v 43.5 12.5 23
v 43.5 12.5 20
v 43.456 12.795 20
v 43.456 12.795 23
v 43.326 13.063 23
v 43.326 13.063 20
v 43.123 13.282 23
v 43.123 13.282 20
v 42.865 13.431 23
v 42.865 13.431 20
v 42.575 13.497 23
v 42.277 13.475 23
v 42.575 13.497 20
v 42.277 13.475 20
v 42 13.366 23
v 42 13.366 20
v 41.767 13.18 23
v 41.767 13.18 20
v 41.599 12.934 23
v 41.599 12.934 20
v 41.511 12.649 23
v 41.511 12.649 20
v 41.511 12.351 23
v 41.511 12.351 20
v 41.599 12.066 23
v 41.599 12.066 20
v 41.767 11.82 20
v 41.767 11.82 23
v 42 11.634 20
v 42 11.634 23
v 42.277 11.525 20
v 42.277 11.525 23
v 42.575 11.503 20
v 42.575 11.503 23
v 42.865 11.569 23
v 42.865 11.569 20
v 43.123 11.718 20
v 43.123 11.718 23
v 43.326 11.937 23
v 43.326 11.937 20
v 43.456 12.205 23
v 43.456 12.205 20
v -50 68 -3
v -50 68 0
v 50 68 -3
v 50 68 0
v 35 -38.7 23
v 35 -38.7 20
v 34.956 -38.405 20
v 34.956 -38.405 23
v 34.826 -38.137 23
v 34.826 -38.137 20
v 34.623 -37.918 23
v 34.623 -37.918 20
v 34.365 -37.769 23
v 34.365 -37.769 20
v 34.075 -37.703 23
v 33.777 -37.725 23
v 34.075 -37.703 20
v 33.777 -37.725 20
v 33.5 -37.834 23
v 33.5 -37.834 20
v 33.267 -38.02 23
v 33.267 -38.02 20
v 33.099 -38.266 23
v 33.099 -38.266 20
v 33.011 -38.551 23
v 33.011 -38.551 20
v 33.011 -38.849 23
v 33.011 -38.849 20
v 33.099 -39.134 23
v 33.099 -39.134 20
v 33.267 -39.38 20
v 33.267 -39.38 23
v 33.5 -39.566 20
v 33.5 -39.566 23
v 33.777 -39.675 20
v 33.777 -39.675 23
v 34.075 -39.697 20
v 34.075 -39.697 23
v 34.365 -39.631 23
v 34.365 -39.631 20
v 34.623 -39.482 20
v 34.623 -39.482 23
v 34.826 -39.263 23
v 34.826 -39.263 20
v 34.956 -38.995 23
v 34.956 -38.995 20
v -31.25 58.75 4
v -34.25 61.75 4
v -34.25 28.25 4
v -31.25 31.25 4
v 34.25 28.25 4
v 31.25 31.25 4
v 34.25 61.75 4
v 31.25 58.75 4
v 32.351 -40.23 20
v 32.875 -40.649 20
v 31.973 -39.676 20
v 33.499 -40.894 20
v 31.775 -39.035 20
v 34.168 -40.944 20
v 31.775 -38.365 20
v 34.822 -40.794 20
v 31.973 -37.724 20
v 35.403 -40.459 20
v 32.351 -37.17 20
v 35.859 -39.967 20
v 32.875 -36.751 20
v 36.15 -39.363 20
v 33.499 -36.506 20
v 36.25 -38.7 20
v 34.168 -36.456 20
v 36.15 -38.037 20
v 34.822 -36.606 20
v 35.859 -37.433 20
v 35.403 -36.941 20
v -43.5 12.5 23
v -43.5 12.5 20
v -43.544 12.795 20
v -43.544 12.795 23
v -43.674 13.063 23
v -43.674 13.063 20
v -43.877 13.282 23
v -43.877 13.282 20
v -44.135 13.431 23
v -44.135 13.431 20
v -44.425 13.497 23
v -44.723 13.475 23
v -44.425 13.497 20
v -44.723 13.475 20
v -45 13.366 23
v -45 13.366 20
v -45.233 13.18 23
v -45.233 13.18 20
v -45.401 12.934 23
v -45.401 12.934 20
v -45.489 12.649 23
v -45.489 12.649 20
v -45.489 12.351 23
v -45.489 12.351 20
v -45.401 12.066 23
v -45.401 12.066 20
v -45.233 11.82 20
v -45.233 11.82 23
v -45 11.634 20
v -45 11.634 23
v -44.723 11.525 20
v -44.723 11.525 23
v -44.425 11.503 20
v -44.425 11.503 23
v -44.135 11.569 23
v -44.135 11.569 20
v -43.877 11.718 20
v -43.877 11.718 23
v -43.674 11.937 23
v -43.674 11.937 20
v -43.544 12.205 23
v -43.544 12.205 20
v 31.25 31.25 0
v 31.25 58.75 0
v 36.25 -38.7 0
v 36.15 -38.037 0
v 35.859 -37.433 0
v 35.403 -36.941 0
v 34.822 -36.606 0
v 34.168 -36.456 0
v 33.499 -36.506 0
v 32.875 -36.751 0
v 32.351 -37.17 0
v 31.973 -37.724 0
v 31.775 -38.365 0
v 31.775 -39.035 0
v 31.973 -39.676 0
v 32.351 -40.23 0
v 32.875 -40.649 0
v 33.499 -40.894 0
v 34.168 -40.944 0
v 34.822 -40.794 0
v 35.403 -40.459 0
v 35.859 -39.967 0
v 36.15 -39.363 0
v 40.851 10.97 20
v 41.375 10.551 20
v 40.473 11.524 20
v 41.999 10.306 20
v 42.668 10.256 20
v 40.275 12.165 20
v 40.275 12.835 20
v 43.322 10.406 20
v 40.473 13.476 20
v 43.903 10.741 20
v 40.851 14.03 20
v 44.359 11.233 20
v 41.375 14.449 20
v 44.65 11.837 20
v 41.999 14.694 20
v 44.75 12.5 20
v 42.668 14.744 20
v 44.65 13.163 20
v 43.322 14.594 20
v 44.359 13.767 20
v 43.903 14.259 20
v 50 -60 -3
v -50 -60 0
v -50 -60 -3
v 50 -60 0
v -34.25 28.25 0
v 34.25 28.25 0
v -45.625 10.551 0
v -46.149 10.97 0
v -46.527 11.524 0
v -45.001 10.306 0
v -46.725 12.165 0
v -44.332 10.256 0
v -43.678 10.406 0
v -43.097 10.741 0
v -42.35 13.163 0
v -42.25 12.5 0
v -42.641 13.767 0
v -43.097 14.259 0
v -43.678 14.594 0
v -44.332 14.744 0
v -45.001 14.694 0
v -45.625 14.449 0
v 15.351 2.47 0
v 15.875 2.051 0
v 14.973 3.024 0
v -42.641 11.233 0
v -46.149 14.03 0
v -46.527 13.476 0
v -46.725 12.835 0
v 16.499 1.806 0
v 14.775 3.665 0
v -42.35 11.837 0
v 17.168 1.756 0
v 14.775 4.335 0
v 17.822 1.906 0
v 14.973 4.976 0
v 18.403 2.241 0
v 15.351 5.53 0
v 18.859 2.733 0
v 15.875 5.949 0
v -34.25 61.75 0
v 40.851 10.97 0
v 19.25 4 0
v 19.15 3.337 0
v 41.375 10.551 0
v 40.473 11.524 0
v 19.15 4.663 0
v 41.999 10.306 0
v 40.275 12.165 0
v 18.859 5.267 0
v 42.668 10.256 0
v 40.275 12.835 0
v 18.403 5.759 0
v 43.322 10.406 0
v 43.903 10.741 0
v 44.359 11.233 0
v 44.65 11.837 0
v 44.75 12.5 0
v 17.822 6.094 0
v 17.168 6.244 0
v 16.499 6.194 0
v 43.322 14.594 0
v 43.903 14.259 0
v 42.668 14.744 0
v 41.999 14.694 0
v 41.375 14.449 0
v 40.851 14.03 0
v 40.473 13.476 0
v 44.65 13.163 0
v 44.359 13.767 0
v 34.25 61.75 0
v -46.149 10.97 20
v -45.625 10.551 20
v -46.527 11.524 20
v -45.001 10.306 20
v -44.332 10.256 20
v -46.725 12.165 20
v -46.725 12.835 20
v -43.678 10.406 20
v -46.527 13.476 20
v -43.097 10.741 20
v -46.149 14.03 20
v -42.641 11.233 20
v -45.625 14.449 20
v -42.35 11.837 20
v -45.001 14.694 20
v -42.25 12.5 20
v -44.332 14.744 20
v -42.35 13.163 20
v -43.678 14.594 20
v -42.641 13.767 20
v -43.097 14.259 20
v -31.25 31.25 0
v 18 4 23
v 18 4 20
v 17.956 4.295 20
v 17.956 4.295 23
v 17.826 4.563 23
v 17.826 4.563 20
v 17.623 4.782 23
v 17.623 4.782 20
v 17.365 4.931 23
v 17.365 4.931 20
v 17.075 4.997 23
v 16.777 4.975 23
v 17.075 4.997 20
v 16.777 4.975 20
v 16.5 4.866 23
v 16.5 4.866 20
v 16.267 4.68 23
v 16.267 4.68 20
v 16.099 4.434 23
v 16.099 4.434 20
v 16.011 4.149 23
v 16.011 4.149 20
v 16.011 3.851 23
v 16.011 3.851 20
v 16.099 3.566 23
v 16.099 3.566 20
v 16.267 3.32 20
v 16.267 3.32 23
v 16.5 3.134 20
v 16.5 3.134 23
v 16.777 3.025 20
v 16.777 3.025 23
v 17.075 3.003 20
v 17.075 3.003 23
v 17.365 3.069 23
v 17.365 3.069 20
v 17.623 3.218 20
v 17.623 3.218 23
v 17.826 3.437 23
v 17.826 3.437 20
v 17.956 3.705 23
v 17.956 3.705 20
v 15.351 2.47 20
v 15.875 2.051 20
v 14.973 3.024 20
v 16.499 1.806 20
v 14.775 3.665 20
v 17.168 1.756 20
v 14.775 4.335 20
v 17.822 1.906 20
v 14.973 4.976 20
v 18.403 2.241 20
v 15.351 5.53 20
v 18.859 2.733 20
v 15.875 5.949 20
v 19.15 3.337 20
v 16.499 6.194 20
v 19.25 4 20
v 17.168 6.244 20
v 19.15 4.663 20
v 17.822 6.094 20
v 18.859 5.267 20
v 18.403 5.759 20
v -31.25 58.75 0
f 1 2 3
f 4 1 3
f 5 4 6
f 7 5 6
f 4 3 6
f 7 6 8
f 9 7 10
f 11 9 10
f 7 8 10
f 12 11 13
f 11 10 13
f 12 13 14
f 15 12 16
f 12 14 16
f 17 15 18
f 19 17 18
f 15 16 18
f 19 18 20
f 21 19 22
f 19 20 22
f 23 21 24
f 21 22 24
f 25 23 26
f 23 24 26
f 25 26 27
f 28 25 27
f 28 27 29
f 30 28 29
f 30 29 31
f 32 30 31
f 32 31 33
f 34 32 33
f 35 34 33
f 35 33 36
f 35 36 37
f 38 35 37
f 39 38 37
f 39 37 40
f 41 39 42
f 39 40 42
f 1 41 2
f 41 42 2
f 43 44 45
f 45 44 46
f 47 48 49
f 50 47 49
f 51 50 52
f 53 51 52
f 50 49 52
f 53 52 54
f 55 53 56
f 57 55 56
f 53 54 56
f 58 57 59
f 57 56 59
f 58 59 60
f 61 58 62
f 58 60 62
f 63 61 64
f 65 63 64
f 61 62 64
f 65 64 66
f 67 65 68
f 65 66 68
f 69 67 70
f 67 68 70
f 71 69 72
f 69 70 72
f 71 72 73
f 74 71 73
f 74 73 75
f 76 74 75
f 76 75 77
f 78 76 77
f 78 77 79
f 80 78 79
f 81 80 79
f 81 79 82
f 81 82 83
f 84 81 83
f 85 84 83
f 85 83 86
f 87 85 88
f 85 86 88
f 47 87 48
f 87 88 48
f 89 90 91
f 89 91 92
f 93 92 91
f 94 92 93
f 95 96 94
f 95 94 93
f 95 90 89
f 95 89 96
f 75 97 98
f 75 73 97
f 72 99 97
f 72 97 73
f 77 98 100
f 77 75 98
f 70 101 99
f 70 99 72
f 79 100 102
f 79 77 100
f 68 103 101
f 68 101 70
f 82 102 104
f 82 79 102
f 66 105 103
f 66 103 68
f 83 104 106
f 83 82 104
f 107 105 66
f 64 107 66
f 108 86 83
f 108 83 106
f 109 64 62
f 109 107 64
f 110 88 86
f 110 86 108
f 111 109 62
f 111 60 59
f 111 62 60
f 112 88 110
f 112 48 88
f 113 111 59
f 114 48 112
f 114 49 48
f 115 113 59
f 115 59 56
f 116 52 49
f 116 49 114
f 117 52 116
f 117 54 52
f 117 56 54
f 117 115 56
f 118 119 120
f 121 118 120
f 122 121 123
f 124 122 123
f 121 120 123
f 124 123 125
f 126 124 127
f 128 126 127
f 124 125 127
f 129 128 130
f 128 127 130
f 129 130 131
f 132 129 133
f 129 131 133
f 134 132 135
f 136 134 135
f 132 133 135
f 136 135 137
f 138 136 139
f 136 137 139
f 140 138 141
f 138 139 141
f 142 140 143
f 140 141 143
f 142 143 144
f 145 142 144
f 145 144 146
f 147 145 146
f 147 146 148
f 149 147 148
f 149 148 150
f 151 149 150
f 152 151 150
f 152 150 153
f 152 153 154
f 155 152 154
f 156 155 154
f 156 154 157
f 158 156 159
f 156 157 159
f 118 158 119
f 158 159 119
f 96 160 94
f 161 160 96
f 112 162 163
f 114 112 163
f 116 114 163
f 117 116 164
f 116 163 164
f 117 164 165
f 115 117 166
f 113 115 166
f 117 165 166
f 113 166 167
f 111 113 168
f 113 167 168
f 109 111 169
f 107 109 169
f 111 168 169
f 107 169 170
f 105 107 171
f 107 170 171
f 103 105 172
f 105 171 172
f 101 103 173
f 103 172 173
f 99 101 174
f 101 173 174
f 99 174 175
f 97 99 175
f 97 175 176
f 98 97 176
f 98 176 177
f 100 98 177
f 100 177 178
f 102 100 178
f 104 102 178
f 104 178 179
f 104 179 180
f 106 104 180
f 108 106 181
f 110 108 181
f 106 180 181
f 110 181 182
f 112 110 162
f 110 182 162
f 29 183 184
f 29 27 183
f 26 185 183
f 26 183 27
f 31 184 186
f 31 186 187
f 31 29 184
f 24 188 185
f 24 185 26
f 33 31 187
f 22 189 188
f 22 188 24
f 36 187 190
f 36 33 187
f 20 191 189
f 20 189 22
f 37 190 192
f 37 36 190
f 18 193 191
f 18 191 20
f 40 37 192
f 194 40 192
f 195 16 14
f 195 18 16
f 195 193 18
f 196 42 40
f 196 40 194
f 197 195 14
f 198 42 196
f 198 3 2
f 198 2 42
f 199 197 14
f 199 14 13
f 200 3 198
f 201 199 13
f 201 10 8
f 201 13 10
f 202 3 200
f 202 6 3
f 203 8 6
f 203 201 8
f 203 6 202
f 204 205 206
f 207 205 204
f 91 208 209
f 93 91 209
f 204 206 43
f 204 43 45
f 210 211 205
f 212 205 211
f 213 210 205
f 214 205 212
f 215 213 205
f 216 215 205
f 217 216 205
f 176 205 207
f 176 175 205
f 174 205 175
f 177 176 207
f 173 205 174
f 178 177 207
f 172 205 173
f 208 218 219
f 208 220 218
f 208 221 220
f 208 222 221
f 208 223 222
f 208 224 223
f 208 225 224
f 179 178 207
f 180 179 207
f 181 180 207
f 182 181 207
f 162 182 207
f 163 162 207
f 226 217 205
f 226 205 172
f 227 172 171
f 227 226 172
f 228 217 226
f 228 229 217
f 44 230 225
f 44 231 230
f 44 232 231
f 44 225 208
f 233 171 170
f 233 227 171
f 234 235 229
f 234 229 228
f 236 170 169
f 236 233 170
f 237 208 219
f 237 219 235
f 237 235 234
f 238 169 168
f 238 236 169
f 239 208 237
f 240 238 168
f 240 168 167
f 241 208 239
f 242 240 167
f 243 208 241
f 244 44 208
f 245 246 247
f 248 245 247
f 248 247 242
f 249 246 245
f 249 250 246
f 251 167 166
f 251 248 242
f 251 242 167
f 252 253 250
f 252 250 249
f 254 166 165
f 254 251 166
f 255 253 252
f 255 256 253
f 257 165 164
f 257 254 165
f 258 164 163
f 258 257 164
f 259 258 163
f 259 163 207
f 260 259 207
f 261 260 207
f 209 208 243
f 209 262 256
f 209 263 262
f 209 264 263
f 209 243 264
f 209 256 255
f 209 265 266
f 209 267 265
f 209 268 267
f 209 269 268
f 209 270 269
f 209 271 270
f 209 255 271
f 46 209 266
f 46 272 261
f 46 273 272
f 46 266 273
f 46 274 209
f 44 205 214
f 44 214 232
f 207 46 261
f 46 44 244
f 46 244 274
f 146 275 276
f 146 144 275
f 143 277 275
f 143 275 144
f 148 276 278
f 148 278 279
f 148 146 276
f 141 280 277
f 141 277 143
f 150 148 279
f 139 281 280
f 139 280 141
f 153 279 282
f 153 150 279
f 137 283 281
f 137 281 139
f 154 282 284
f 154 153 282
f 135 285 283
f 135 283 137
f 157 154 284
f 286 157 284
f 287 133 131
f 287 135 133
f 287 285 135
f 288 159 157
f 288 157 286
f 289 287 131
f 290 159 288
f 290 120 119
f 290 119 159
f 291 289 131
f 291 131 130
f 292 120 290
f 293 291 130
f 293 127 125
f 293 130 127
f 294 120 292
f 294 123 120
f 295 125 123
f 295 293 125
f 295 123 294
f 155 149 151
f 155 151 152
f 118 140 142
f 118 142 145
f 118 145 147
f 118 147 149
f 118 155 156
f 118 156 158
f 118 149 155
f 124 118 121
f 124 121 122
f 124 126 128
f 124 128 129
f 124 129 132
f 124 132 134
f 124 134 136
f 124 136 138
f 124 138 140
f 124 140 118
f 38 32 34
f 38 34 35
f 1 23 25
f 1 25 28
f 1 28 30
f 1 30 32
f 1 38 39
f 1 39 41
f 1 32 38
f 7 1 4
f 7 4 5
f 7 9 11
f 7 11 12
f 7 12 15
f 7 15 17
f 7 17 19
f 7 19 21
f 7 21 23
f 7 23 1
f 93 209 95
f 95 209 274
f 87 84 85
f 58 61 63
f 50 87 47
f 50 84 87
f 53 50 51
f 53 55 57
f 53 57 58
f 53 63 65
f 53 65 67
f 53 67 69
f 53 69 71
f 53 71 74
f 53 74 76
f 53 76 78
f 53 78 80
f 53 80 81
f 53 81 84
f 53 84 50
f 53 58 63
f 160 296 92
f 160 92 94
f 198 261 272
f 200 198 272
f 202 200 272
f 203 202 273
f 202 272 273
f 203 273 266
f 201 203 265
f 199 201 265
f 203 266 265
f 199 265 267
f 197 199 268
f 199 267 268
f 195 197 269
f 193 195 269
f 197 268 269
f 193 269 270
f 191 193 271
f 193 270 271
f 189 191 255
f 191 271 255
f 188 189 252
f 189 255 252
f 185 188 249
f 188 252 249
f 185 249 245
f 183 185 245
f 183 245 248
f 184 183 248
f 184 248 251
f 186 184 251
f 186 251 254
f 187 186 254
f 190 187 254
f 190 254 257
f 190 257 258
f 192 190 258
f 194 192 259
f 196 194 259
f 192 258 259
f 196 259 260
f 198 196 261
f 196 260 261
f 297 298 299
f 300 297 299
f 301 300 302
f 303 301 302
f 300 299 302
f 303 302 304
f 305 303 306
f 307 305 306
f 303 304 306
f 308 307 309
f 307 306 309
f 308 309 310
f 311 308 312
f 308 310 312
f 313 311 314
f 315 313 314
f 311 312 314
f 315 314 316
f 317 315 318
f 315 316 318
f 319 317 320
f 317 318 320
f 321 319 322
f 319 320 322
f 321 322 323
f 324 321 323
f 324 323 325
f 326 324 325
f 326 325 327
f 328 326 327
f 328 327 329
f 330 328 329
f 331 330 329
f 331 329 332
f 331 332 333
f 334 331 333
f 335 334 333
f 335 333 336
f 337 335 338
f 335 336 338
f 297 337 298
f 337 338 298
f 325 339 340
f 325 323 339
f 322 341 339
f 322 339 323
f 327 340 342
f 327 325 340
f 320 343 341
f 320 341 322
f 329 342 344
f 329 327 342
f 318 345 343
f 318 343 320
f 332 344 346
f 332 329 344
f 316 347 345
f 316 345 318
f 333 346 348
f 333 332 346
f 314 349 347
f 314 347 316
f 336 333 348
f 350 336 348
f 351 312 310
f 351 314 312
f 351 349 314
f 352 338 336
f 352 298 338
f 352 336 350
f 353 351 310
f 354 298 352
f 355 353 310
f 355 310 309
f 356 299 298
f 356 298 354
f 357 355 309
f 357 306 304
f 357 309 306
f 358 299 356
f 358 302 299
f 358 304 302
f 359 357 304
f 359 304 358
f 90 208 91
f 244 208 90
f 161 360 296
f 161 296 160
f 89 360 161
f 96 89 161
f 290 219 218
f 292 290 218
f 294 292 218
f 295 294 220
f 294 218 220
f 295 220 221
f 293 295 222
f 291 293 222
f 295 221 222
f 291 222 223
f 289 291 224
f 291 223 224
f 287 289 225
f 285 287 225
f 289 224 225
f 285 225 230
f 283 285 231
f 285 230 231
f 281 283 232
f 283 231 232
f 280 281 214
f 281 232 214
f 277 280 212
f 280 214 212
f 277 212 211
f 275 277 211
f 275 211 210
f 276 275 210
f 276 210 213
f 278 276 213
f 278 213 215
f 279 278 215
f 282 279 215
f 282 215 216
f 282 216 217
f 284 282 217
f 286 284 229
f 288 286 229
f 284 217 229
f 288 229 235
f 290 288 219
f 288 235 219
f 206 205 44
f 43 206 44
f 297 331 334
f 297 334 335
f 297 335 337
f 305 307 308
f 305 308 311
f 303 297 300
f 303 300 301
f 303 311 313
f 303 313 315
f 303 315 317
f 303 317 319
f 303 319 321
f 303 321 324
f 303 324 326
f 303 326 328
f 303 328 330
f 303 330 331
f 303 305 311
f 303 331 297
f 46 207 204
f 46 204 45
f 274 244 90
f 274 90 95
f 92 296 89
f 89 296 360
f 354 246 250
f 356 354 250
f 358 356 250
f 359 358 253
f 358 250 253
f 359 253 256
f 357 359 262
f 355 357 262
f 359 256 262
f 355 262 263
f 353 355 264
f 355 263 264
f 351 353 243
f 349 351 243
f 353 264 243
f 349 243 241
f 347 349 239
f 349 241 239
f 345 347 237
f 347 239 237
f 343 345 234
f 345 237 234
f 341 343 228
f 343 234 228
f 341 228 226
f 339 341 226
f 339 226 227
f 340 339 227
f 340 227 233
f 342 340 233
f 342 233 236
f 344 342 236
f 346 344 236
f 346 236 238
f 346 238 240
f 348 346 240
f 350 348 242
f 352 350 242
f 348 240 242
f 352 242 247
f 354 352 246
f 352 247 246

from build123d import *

# Parameters (mm, degrees)
F0_W      = 100
F0_H      = 128
F0_R      = 2.25
F0_W_2    = 68.5
F0_H_2    = 33.5
F0_W_3    = 62.5
F0_H_3    = 27.5
F1_DEPTH  = 3
F2_DEPTH  = 20
F3_DEPTH  = 4
F4_R      = 1
F5_DEPTH  = 3
F6_R      = 1
F7_DEPTH  = 3
F8_R      = 1
F9_DEPTH  = 3
F10_R     = 1
F11_DEPTH = 3


with BuildPart() as f1:
    # F0 (on Top) → F1 (new body)
    with BuildSketch(Plane.XY):
        with Locations((0, 4)):
            Rectangle(F0_W, F0_H)
        with Locations((34, -38.7)):
            Circle(F0_R, mode=Mode.SUBTRACT)
        with Locations((-44.5, 12.5)):
            Circle(F0_R, mode=Mode.SUBTRACT)
        with Locations((17, 4)):
            Circle(F0_R, mode=Mode.SUBTRACT)
        with Locations((42.5, 12.5)):
            Circle(F0_R, mode=Mode.SUBTRACT)
        with Locations((0, 45)):
            Rectangle(F0_W_2, F0_H_2, mode=Mode.SUBTRACT)
        with Locations((0, 45)):
            Rectangle(F0_W_2, F0_H_2)
        with Locations((0, 45)):
            Rectangle(F0_W_3, F0_H_3, mode=Mode.SUBTRACT)
        with Locations((-44.5, 12.5)):
            Circle(F0_R)
        with Locations((17, 4)):
            Circle(F0_R)
        with Locations((42.5, 12.5)):
            Circle(F0_R)
        with Locations((0, 45)):
            Rectangle(F0_W_3, F0_H_3)
        with Locations((34, -38.7)):
            Circle(F0_R)
    extrude(amount=-F1_DEPTH)

    # F0 (on Top) → F2 (join)
    with BuildSketch(Plane.XY):
        with Locations((-44.5, 12.5)):
            Circle(F0_R)
        with Locations((17, 4)):
            Circle(F0_R)
        with Locations((42.5, 12.5)):
            Circle(F0_R)
        with Locations((34, -38.7)):
            Circle(F0_R)
    extrude(amount=F2_DEPTH)

    # F0 (on Top) → F3 (join)
    with BuildSketch(Plane.XY):
        with Locations((0, 45)):
            Rectangle(F0_W_2, F0_H_2)
        with Locations((0, 45)):
            Rectangle(F0_W_3, F0_H_3, mode=Mode.SUBTRACT)
    extrude(amount=F3_DEPTH)

    # F4 (on face) → F5 (join)
    with BuildSketch(Plane.XY.offset(20)):
        with Locations((-44.5, 12.5)):
            Circle(F4_R)
    extrude(amount=F5_DEPTH)

    # F6 (on face) → F7 (join)
    with BuildSketch(Plane.XY.offset(20)):
        with Locations((17, 4)):
            Circle(F6_R)
    extrude(amount=F7_DEPTH)

    # F8 (on face) → F9 (join)
    with BuildSketch(Plane.XY.offset(20)):
        with Locations((42.5, 12.5)):
            Circle(F8_R)
    extrude(amount=F9_DEPTH)

    # F10 (on face) → F11 (join)
    with BuildSketch(Plane.XY.offset(20)):
        with Locations((34, -38.7)):
            Circle(F10_R)
    extrude(amount=F11_DEPTH)


solid = f1.part
